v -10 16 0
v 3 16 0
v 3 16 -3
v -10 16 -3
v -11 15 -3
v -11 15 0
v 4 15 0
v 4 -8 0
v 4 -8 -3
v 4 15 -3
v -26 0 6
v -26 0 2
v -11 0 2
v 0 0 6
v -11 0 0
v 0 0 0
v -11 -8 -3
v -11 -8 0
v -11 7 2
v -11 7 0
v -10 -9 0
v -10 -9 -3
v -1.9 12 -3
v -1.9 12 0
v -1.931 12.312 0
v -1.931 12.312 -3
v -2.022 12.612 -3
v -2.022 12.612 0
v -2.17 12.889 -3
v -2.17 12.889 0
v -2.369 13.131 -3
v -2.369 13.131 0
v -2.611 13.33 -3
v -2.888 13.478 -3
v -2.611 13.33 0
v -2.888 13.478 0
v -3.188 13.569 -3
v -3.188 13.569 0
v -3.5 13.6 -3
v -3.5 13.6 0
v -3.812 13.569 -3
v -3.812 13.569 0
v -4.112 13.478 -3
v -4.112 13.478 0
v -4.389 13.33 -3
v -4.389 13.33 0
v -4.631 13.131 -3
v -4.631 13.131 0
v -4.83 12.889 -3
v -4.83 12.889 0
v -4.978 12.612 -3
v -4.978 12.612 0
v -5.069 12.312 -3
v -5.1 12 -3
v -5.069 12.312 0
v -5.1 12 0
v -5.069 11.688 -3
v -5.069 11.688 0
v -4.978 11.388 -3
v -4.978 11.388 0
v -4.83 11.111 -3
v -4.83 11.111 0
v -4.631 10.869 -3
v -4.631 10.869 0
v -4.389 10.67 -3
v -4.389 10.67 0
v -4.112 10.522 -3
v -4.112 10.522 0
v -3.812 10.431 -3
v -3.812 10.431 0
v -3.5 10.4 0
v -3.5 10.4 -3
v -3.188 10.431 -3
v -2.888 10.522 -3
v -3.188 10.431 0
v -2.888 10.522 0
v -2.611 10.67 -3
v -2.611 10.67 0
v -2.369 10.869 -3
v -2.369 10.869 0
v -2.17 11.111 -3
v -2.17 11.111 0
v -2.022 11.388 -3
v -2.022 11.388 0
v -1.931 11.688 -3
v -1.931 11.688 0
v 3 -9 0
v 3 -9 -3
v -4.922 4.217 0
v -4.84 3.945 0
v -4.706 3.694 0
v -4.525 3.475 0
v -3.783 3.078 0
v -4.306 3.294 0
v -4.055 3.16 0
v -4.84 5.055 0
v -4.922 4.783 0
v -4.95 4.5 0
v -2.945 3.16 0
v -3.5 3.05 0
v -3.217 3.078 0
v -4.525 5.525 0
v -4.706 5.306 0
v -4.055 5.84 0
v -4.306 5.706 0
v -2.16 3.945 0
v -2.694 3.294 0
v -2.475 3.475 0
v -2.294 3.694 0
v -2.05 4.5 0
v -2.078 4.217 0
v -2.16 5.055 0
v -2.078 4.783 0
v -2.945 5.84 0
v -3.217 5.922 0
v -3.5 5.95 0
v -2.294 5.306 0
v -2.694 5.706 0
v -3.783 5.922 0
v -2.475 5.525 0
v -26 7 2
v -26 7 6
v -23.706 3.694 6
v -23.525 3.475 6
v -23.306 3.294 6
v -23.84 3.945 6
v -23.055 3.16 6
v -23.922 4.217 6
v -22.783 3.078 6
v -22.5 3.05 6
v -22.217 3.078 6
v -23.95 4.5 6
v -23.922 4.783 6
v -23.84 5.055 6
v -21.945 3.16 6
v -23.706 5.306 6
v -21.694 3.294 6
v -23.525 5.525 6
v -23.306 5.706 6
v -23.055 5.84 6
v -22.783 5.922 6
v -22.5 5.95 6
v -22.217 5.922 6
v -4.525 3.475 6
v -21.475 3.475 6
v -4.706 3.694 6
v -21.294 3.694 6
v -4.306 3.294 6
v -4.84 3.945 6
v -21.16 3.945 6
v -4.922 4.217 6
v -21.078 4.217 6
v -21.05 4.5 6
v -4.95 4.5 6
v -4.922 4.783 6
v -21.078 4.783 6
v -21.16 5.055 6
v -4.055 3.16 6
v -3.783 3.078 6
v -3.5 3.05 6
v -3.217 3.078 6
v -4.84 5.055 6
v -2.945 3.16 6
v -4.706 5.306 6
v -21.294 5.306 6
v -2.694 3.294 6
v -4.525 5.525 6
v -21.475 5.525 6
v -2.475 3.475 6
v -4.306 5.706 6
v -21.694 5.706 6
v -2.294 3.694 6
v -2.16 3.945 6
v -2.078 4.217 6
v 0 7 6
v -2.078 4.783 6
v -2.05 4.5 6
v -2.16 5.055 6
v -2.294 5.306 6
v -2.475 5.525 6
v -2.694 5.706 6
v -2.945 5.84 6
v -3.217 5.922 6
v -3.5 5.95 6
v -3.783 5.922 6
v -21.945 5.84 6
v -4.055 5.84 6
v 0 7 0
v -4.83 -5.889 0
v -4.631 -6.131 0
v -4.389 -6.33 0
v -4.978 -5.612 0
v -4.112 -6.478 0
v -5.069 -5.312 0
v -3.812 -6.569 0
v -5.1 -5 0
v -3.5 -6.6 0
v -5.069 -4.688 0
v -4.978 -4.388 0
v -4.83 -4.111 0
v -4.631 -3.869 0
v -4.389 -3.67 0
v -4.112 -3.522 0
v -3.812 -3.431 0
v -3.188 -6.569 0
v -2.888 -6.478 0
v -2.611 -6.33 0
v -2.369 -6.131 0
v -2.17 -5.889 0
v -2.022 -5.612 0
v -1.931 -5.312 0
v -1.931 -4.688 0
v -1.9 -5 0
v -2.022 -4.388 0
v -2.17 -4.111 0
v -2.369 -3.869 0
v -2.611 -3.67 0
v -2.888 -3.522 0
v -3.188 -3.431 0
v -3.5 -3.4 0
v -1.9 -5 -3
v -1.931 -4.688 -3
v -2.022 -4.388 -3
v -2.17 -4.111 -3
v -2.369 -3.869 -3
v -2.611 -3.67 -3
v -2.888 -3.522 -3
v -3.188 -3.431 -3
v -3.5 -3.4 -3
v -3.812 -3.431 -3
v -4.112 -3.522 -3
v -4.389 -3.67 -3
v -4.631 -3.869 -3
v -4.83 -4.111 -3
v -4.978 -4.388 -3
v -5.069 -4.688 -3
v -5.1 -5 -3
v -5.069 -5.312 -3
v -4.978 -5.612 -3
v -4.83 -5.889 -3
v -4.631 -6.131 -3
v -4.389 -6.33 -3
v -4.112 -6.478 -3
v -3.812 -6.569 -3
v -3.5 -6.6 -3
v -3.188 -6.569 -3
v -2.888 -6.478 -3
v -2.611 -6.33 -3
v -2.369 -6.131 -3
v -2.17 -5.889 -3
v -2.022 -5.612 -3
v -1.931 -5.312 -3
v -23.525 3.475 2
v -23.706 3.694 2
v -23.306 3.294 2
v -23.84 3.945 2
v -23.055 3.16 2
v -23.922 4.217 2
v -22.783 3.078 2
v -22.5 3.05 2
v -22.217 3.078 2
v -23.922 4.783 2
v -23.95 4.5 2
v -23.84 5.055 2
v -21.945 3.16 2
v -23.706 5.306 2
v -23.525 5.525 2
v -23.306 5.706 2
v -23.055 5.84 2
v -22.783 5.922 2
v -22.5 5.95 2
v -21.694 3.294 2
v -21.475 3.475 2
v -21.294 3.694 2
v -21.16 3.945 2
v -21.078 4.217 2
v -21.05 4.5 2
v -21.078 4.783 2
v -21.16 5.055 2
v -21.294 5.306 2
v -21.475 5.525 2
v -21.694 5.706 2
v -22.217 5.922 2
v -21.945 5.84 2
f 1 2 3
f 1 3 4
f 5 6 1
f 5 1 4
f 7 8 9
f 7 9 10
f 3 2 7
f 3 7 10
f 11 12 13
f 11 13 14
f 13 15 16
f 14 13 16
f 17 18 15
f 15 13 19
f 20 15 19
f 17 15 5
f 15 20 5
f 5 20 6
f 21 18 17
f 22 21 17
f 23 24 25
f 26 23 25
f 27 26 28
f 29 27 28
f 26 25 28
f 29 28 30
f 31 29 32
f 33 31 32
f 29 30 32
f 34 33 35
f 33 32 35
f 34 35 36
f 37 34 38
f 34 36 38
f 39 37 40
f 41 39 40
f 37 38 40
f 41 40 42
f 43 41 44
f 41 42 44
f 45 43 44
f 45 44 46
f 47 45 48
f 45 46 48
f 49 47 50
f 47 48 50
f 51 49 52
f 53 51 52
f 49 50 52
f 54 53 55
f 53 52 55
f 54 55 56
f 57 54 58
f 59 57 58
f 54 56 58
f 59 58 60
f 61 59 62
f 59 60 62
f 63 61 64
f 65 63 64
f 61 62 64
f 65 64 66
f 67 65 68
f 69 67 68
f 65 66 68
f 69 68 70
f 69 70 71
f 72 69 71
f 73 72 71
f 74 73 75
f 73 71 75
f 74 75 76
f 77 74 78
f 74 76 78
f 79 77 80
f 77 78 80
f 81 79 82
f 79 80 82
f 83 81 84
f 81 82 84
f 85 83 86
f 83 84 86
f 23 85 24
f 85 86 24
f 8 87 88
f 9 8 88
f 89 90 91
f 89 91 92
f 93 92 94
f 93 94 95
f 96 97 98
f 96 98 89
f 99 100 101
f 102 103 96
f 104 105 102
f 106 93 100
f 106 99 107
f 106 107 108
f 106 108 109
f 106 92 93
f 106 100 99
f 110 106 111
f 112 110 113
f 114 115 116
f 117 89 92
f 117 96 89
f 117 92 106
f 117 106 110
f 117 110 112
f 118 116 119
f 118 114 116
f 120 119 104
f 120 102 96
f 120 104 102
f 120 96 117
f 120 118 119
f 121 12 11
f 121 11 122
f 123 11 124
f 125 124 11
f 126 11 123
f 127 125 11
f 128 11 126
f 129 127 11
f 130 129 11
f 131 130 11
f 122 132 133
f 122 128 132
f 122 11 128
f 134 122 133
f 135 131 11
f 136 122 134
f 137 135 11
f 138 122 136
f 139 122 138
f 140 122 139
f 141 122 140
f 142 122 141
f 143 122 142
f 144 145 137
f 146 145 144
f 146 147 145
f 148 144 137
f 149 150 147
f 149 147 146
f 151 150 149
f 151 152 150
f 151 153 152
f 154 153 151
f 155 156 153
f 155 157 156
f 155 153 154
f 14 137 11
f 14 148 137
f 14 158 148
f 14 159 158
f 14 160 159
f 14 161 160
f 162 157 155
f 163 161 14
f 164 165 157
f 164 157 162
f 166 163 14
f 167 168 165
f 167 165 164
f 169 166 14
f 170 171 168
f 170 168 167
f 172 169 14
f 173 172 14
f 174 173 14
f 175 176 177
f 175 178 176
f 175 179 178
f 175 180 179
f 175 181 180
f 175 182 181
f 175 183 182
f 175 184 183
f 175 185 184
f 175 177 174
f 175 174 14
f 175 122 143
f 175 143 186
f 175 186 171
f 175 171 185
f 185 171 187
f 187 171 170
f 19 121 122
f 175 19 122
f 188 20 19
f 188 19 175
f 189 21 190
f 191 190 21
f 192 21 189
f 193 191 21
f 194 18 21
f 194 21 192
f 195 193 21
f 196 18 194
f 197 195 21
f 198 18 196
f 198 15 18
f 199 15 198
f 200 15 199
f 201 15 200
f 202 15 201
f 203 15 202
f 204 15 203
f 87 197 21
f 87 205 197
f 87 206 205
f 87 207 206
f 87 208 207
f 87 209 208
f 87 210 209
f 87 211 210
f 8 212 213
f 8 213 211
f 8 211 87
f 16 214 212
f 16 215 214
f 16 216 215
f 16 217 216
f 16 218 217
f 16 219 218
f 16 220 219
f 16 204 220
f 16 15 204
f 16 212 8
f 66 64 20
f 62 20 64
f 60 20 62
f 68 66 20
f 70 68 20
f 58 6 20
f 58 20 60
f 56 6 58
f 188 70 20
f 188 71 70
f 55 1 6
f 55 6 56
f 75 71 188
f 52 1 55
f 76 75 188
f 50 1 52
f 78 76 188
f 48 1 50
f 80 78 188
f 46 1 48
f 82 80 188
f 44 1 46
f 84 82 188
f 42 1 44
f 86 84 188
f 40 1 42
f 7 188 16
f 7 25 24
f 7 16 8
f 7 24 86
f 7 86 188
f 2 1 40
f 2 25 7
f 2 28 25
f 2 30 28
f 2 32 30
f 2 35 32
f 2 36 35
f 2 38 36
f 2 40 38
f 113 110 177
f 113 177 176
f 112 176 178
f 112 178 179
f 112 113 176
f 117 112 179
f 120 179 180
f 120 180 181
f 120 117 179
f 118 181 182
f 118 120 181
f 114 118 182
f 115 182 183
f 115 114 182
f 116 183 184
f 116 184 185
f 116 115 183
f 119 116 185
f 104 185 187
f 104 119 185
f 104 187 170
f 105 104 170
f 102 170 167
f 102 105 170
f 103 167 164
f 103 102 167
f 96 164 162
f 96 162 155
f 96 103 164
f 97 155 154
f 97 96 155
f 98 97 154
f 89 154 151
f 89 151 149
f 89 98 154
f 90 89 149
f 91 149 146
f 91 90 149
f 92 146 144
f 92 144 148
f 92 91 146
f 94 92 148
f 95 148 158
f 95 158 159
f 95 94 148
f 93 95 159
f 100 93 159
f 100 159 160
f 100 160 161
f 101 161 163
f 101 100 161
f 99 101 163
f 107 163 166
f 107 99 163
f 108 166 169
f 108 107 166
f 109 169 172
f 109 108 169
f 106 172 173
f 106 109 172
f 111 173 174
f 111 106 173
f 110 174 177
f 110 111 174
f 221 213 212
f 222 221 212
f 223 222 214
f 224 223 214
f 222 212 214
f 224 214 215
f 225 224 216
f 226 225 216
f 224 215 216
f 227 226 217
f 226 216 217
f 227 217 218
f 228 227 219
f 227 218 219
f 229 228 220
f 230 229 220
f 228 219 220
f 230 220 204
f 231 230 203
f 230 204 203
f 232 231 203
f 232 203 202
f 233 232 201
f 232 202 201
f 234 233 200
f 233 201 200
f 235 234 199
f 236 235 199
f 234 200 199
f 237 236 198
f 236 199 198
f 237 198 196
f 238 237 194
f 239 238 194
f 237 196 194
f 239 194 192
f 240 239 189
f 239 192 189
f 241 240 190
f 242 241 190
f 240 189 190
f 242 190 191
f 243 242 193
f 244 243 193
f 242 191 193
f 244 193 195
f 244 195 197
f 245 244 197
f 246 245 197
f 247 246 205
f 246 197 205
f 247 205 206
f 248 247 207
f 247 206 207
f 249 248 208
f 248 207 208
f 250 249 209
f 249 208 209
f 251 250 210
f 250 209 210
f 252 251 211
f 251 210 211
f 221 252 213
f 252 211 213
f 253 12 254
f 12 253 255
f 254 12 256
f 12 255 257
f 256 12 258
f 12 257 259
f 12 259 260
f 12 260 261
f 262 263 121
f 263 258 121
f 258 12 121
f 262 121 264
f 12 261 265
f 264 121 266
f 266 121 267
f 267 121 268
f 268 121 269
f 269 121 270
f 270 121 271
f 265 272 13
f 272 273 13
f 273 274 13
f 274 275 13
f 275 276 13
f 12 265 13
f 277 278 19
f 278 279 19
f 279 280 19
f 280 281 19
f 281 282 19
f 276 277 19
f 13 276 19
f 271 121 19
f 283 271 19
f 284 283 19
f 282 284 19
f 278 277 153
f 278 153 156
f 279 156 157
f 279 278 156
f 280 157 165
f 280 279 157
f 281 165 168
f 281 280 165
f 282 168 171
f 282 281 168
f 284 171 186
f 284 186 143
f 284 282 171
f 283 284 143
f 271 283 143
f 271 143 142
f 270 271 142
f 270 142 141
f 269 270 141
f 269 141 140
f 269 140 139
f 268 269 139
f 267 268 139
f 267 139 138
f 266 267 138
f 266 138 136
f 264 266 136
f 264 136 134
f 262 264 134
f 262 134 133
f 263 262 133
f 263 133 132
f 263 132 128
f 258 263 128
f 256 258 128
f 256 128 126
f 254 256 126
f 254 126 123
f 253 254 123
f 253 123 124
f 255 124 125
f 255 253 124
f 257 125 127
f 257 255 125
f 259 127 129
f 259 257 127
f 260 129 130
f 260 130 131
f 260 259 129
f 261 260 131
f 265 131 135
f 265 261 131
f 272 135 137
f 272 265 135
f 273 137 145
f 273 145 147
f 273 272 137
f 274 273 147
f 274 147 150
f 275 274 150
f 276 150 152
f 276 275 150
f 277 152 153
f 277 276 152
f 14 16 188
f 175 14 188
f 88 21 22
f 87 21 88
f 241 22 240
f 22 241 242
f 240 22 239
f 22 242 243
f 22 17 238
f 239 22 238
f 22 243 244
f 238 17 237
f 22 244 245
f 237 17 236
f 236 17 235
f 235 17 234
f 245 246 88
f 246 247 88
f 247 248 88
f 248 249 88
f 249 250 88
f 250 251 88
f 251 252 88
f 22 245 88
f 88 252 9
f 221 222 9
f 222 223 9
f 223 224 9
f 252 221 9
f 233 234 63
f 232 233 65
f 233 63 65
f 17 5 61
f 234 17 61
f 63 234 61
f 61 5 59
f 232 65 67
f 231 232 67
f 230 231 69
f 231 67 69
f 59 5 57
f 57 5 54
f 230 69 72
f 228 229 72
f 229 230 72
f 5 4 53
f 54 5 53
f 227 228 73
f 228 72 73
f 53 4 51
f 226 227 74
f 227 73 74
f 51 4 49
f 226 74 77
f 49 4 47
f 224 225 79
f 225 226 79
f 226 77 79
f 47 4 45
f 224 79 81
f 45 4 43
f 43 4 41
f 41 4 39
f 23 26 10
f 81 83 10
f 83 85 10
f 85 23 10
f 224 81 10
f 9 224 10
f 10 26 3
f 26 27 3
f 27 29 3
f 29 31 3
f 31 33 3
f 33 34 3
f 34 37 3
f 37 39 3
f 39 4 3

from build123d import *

# Parameters (mm, degrees)
F0_W     = 26
F0_H     = 7
F0_R     = 1.45
F1_DEPTH = 6
F2_W     = 5
F2_H     = 25
F2_R     = 1.6
F3_DEPTH = 3
F4_SIZE  = 1
F6_DEPTH = 2


# Not quite as in the source:
# - a feature of the source that left no trace in its solid (it failed there, or was rolled back) is left out


with BuildPart() as f1:
    # F0 (on Top) → F1 (new body)
    with BuildSketch(Plane.XY):
        with Locations((-13, 3.5)):
            Rectangle(F0_W, F0_H)
        with Locations((-22.5, 4.5)):
            Circle(F0_R, mode=Mode.SUBTRACT)
        with Locations((-3.5, 4.5)):
            Circle(F0_R, mode=Mode.SUBTRACT)
    extrude(amount=F1_DEPTH)

    # F2 (on Top) → F3 (join)
    with BuildSketch(Plane.XY):
        with Locations((1.5, 3.5)):
            Rectangle(F2_W, F2_H)
        with Locations((-3.5, 3.5)):
            Rectangle(F2_W, F2_H)
        with Locations((-3.5, -5)):
            Circle(F2_R, mode=Mode.SUBTRACT)
        with Locations((-3.5, 12)):
            Circle(F2_R, mode=Mode.SUBTRACT)
        with Locations((-8.5, 3.5)):
            Rectangle(F2_W, F2_H)
    extrude(amount=-F3_DEPTH)

    # F4
    f4_edges = [f1.edges().sort_by_distance(p)[0] for p in [
        (4, 16, -1.5),
        (-11, 16, -1.5),
        (4, -9, -1.5),
        (-11, -9, -1.5),
    ]]
    chamfer(f4_edges, length=F4_SIZE)

    # F6 (cut): a face of the model
    f6_faces = [f1.faces().sort_by_distance(p)[0] for p in [
        (-18.2314818077, 3.4328704519, 0),
    ]]
    extrude(f6_faces, amount=-F6_DEPTH, mode=Mode.SUBTRACT)


solid = f1.part
